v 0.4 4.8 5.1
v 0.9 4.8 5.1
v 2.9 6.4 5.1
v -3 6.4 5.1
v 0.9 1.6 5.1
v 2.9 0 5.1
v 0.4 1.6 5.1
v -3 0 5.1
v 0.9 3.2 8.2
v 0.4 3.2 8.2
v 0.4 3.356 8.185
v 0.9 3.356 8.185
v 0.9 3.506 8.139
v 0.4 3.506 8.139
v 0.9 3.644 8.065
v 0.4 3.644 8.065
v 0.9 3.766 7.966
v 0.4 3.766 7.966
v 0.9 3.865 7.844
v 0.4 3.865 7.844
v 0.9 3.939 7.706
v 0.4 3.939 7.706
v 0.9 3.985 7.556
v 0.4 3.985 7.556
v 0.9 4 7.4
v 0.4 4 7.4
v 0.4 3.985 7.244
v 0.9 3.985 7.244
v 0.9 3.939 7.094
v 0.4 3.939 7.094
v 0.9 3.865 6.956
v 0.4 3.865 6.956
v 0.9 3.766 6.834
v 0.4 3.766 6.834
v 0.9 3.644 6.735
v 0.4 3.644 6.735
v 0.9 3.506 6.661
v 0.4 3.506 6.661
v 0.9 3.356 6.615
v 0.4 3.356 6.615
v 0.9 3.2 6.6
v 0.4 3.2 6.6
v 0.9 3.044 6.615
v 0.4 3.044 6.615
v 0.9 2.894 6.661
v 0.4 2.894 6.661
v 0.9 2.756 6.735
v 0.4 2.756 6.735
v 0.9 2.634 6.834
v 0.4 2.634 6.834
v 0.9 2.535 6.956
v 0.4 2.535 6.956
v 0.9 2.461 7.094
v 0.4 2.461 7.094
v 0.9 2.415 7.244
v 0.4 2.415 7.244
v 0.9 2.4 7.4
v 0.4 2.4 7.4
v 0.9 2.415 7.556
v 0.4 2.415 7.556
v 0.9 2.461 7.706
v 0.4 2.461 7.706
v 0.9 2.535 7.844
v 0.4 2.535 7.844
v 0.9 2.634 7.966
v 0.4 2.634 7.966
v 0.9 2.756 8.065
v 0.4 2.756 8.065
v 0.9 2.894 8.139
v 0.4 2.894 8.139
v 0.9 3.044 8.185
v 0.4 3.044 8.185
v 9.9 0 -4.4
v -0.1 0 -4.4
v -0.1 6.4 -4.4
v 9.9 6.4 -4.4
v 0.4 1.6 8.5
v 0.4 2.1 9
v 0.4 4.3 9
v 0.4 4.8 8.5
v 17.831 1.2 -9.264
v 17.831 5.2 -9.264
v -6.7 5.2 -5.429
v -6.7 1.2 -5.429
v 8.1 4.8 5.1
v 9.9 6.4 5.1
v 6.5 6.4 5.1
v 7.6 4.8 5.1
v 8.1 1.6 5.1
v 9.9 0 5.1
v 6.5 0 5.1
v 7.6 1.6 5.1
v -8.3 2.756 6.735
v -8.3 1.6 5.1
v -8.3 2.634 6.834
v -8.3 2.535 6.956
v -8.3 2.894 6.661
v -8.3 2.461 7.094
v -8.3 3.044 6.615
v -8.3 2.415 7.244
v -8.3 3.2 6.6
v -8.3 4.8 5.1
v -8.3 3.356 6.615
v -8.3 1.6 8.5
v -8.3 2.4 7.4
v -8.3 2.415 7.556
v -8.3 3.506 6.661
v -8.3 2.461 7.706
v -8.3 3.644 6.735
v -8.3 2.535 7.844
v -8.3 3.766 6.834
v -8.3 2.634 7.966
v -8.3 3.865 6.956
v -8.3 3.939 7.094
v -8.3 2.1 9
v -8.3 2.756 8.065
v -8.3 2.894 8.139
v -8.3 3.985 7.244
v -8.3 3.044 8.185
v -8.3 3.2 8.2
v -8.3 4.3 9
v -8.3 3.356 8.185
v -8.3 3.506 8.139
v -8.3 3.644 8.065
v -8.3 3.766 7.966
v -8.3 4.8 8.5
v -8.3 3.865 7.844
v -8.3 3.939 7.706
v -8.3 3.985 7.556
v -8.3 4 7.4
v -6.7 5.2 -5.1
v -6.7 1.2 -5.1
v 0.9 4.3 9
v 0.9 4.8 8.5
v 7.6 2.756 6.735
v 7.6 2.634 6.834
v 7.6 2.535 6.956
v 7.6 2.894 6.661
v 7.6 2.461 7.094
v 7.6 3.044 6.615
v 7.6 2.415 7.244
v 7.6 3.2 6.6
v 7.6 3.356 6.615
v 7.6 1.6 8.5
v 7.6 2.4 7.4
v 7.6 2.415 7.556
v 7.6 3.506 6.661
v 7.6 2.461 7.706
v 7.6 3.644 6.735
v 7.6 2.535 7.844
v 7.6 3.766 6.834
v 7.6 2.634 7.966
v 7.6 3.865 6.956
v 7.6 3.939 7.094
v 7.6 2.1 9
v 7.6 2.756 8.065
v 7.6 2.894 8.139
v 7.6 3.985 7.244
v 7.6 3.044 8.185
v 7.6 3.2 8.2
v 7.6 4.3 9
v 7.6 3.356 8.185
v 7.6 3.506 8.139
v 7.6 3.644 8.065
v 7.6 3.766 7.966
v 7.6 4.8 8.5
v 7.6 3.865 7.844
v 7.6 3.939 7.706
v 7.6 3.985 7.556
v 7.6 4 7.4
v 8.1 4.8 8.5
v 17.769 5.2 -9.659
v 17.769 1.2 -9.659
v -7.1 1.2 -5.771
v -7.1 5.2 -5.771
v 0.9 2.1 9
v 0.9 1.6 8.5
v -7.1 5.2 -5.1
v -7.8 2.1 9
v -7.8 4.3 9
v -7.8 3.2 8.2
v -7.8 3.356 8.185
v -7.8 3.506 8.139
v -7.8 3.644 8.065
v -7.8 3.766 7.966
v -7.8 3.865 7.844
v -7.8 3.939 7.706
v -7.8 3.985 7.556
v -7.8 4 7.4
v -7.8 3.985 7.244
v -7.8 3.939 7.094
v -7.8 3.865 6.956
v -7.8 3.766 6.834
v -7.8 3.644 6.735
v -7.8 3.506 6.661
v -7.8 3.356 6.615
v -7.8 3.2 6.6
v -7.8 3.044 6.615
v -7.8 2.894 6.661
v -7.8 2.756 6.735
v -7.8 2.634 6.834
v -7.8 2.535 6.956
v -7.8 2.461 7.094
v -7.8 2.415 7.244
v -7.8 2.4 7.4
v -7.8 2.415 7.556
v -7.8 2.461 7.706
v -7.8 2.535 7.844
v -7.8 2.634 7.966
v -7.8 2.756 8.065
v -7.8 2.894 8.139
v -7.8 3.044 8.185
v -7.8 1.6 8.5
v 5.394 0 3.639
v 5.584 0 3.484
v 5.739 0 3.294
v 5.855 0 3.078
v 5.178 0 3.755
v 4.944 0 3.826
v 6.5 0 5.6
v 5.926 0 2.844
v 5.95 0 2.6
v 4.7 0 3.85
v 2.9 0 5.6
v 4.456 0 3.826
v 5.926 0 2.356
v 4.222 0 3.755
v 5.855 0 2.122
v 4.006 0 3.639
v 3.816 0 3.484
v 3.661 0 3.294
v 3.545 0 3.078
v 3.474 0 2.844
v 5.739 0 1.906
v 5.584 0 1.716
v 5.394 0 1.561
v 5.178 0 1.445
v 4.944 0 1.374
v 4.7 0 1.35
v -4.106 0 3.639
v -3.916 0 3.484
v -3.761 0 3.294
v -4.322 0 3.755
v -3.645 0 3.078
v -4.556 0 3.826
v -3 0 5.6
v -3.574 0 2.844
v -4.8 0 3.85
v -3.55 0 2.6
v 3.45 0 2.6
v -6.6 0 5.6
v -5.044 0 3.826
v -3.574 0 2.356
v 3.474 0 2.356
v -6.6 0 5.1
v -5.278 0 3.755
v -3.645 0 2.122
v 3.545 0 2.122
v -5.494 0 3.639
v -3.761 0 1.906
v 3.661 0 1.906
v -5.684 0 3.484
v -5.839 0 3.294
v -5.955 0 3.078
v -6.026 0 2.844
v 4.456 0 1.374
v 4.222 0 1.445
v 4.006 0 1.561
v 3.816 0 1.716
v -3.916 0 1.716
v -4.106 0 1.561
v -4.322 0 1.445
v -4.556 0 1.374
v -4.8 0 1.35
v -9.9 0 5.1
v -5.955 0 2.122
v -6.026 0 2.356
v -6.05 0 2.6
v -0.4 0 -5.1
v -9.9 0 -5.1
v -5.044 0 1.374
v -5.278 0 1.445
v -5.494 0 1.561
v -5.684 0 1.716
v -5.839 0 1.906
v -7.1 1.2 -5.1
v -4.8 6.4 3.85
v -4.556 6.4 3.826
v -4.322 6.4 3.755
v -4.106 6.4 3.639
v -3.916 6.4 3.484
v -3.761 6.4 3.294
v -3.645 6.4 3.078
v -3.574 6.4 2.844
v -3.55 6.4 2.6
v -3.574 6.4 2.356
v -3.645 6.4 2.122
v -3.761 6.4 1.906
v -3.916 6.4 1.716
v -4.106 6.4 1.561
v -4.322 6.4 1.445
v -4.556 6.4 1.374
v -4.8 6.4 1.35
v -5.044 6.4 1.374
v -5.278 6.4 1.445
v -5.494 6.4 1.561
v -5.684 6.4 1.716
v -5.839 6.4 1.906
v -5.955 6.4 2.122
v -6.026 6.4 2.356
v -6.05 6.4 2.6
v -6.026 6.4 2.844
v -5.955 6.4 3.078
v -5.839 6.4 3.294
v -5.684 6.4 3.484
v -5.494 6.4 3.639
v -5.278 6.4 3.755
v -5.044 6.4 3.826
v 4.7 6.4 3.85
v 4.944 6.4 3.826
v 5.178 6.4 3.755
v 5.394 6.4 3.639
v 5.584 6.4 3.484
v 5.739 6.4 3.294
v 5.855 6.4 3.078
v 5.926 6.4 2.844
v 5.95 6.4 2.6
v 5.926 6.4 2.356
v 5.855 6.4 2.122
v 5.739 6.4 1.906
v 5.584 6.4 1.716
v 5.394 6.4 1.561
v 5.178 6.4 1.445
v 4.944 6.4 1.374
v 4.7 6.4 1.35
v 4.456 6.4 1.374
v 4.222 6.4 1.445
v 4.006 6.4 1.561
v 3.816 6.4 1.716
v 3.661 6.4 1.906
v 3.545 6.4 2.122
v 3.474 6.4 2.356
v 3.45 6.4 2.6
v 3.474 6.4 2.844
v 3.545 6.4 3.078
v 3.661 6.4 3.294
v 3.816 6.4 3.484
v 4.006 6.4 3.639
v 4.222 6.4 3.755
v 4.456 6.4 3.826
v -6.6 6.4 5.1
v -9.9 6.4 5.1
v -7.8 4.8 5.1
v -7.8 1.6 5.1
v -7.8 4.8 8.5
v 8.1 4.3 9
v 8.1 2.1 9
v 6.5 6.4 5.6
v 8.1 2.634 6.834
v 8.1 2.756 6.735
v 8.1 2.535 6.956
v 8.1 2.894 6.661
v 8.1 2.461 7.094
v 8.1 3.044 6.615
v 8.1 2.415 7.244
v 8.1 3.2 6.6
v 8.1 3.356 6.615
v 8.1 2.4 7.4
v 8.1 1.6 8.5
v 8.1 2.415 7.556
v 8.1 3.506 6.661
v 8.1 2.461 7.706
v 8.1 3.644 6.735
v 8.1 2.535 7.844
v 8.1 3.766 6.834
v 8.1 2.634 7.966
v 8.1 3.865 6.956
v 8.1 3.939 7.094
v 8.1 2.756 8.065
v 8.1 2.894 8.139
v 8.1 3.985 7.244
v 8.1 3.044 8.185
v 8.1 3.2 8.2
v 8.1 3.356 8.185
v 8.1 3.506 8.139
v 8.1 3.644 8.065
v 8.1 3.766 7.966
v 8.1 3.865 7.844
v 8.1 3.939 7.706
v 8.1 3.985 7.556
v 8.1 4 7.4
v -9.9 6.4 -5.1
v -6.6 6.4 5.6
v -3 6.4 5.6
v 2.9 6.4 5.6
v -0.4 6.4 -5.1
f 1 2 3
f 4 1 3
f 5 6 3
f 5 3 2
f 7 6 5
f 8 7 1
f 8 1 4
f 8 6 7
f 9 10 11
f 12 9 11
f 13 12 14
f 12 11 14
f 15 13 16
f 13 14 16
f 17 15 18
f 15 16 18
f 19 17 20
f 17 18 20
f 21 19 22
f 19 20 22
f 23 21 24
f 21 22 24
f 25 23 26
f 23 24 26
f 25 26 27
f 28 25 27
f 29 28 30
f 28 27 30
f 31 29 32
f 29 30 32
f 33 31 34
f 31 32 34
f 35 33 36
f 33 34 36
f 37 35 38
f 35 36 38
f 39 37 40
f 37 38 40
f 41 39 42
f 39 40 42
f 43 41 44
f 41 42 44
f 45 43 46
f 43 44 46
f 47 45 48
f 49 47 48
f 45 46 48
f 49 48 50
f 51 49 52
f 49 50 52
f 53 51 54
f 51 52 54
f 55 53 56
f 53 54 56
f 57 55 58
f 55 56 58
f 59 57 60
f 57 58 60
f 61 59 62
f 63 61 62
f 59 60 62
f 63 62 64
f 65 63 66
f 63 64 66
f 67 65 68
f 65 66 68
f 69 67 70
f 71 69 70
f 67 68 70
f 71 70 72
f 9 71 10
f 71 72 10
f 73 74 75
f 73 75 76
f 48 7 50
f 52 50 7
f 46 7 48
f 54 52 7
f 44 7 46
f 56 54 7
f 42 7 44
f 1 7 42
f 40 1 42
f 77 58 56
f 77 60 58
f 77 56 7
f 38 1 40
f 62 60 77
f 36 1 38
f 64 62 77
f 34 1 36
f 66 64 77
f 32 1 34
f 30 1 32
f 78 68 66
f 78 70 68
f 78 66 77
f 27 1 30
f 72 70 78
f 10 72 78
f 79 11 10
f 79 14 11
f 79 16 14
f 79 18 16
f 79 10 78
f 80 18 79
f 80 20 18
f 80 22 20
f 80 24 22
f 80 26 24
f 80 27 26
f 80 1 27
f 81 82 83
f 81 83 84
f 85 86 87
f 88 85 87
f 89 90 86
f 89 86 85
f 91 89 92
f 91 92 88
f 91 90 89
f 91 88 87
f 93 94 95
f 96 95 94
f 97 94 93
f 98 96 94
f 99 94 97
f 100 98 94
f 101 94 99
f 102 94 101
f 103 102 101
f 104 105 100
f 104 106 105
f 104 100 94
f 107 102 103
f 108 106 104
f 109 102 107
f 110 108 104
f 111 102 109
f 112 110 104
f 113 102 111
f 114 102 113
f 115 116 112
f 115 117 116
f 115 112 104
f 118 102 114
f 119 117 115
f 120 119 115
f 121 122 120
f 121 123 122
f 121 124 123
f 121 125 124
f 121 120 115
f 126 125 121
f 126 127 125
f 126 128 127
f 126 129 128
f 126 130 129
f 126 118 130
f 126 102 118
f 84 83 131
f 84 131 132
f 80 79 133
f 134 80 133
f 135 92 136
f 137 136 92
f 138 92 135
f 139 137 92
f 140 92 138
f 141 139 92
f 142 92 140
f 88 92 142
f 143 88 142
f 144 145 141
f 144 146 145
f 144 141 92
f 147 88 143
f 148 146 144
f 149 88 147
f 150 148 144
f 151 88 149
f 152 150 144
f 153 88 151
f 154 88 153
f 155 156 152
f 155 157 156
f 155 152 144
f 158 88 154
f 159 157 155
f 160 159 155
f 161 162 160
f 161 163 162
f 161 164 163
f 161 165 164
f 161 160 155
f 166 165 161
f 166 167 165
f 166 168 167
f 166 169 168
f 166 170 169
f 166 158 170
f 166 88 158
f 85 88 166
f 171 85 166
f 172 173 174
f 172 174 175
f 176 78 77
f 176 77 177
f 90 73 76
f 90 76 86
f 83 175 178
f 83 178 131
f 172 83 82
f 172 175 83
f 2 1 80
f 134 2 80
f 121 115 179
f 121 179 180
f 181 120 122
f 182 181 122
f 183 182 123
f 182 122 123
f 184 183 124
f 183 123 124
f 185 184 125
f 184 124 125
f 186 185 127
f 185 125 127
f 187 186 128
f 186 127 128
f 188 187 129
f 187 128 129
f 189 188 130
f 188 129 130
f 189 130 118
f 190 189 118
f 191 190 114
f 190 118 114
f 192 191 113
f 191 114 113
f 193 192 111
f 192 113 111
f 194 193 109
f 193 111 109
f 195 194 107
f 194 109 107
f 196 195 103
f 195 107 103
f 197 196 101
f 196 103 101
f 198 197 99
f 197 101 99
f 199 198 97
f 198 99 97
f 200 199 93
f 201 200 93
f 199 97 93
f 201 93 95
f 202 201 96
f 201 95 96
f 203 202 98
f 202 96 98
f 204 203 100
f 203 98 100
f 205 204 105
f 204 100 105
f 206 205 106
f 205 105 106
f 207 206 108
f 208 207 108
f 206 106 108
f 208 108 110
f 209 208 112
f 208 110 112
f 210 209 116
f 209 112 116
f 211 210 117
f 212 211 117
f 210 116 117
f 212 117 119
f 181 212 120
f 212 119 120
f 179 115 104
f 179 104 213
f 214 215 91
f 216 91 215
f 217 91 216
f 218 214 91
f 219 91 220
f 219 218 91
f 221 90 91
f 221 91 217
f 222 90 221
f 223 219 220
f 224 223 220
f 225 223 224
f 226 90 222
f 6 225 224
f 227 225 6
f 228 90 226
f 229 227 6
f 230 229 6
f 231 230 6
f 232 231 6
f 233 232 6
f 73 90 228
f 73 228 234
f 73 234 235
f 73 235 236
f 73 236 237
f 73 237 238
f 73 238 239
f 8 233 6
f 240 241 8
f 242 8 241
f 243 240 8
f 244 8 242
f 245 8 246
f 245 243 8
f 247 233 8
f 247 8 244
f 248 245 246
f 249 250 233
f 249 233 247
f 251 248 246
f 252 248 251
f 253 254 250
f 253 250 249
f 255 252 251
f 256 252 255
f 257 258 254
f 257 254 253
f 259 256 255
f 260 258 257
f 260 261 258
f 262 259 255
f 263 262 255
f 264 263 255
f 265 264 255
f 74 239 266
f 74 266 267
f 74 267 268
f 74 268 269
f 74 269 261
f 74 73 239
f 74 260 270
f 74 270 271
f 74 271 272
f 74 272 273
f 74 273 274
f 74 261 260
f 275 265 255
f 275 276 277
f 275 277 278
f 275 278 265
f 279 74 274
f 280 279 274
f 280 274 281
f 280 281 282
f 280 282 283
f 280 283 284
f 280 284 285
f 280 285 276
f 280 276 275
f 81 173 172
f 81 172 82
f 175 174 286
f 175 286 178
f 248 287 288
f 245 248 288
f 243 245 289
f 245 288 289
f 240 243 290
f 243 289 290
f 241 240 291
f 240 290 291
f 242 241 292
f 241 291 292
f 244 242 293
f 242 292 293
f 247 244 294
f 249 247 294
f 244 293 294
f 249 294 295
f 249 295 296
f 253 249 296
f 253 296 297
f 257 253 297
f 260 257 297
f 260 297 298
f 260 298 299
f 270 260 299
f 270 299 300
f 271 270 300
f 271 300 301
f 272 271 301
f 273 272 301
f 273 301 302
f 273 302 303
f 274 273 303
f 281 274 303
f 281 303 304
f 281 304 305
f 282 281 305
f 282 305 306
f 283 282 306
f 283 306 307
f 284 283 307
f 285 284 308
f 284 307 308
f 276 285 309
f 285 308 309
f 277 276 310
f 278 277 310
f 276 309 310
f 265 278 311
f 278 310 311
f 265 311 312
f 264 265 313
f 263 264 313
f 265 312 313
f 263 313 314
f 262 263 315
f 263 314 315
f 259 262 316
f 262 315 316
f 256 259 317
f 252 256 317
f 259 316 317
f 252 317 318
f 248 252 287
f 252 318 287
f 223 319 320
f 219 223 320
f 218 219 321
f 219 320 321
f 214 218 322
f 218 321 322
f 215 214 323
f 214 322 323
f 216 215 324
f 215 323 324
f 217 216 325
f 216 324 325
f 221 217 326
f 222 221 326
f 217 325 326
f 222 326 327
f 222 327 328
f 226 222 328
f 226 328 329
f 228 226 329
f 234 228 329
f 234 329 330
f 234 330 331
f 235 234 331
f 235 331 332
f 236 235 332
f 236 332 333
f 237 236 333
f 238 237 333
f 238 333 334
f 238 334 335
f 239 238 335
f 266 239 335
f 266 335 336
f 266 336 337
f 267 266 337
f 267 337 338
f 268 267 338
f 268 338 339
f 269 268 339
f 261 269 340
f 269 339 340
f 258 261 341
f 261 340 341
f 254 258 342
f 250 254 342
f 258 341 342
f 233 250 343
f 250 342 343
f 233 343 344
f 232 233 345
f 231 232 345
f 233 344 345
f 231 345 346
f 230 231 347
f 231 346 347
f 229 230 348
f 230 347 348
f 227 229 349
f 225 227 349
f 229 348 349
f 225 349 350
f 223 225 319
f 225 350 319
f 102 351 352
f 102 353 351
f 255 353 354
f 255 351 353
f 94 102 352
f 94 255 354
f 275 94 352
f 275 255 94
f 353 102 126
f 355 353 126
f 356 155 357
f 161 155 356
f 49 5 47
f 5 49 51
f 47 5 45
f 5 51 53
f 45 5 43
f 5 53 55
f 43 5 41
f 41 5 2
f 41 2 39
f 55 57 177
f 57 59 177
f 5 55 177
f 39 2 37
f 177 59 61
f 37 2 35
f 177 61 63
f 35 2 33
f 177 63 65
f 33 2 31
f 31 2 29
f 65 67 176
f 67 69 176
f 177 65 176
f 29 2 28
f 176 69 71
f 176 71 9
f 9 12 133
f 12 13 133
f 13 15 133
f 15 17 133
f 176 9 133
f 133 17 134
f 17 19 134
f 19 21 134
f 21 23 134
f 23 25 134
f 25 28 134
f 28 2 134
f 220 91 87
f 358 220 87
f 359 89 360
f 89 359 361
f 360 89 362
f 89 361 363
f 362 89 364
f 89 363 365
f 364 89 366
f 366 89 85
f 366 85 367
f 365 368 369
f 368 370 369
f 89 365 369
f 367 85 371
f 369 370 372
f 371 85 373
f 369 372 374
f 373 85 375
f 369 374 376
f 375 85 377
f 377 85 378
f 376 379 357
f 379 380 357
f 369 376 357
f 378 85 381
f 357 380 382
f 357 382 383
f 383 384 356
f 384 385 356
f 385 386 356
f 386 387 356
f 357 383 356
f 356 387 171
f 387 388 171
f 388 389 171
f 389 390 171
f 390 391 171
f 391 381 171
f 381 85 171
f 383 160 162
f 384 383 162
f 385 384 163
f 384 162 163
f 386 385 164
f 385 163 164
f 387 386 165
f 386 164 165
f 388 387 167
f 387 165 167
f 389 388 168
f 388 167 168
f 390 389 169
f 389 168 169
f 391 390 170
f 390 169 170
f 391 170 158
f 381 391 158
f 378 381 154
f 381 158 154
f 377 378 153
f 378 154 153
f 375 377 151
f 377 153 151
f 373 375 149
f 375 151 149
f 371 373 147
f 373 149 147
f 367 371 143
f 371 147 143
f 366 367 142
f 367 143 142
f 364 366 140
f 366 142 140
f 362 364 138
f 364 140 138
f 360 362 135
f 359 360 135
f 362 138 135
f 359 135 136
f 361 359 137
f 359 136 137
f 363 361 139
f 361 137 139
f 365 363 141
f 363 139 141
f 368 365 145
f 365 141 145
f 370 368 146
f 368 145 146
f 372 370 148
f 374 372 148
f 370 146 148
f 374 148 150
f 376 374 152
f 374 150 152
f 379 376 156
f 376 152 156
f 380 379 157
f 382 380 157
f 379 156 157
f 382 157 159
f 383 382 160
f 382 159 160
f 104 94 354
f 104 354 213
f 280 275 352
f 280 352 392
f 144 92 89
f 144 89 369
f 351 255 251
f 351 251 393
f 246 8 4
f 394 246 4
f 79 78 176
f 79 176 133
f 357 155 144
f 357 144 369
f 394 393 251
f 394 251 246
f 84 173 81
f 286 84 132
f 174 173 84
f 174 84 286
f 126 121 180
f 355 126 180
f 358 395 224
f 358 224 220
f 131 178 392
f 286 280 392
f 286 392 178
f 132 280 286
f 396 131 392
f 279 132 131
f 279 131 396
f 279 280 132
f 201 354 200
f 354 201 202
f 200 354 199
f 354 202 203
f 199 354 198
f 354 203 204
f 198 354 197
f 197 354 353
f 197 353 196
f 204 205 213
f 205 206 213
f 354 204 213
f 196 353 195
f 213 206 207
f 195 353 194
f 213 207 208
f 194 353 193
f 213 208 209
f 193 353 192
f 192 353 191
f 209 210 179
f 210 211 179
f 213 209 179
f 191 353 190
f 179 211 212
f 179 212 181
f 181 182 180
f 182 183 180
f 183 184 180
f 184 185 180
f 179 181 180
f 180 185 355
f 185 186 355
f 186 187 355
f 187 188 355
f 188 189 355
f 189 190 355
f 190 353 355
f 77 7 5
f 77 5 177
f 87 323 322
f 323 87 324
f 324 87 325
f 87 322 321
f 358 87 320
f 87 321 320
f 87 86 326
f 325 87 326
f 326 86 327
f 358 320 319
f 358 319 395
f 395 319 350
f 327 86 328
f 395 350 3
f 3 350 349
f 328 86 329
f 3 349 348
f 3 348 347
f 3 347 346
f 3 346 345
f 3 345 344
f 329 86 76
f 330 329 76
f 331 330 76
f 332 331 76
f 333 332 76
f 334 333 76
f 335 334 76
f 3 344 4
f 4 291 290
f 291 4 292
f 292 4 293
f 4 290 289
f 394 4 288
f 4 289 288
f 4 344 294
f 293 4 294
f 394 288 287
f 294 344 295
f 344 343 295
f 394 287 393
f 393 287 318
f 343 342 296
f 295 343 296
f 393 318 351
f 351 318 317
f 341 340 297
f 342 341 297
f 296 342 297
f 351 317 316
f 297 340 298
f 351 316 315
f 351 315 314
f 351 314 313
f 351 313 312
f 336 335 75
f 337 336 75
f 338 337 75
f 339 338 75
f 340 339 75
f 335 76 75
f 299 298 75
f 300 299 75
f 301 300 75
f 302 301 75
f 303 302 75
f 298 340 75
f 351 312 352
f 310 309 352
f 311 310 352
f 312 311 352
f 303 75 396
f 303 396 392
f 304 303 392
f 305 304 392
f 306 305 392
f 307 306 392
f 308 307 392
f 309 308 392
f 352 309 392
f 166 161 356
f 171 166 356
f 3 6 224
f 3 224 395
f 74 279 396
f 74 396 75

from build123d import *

# Parameters (mm, degrees)
EXTRUDE_1_DEPTH                        = 6.4
SKETCH_3_R                             = 1.25
CUT_EXTRUDE_1_DEPTH                    = 13.844454056
EXTRUDE_START                          = -1.6
SKETCH_4_W                             = 3.9
SKETCH_4_H                             = 3.2
SKETCH_4_R                             = 0.8
EXTRUDE_2_DEPTH                        = 0.5
CHAMFER_1_SIZE                         = 0.5
PATTERN_LINEAR_1_COUNT                 = 2
PATTERN_LINEAR_1_PITCH                 = 8.7
CHAMFER_1_OF_PATTERN_LINEAR_1_SIZE     = 0.5
PATTERN_LINEAR_1_COL_COUNT             = 2
PATTERN_LINEAR_1_COL_PITCH             = 15.9
CHAMFER_1_OF_PATTERN_LINEAR_1_COL_SIZE = 0.5
SKETCH_6_W                             = 0.4
SKETCH_6_H                             = 4
SKETCH_7_W                             = 3.6
SKETCH_7_H                             = 6.4
EXTRUDE_4_DEPTH                        = 0.5


with BuildPart() as part:
    # 草圖1 → 填料-伸長1 (new body)
    with BuildSketch(Plane(origin=(0, 0, 0), x_dir=(1, 0, 0), z_dir=(0, 1, 0))):
        Polygon((-0.4, 5.1), (-0.1, 4.4), (9.9, 4.4), (9.9, -5.1), (-9.9, -5.1), (-9.9, 5.1), align=None)
    extrude(amount=EXTRUDE_1_DEPTH)

    # 草圖3 → 除料-伸長1 (cut, through all)
    with BuildSketch(Plane(origin=(0, 6.4, 0), x_dir=(1, 0, 0), z_dir=(0, 1, 0))):
        with Locations((-4.8, -2.6)):
            Circle(SKETCH_3_R)
        with Locations((4.7, -2.6)):
            Circle(SKETCH_3_R)
    extrude(amount=-CUT_EXTRUDE_1_DEPTH, mode=Mode.SUBTRACT)

    # 草圖4 → 填料-伸長2 (add)
    with BuildSketch(Plane.ZY.offset(9.9).offset(EXTRUDE_START)):
        with Locations((7.05, 3.2)):
            Rectangle(SKETCH_4_W, SKETCH_4_H)
        with Locations((7.4, 3.2)):
            Circle(SKETCH_4_R, mode=Mode.SUBTRACT)
    extrude_2 = extrude(amount=-EXTRUDE_2_DEPTH)

    # 導角1
    chamfer_1_edges = [part.edges().sort_by_distance(p)[0] for p in [
        (-8.05, 1.6, 9),
        (-8.05, 4.8, 9),
    ]]
    chamfer(chamfer_1_edges, length=CHAMFER_1_SIZE)

    # 直線複製排列1: 填料-伸長2 ×2
    with Locations(*[(i * PATTERN_LINEAR_1_PITCH, 0, 0) for i in range(1, PATTERN_LINEAR_1_COUNT)]):
        add(extrude_2)

    # 導角1 of 直線複製排列1
    chamfer_1_of_pattern_linear_1_edges = [part.edges().sort_by_distance(p)[0] for p in [
        (0.65, 1.6, 9),
        (0.65, 4.8, 9),
    ]]
    chamfer(chamfer_1_of_pattern_linear_1_edges, length=CHAMFER_1_OF_PATTERN_LINEAR_1_SIZE)

    # 直線複製排列1 col: 填料-伸長2 ×2
    with Locations(*[(i * PATTERN_LINEAR_1_COL_PITCH, 0, 0) for i in range(1, PATTERN_LINEAR_1_COL_COUNT)]):
        add(extrude_2)

    # 導角1 of 直線複製排列1 col
    chamfer_1_of_pattern_linear_1_col_edges = [part.edges().sort_by_distance(p)[0] for p in [
        (7.85, 1.6, 9),
        (7.85, 4.8, 9),
    ]]
    chamfer(chamfer_1_of_pattern_linear_1_col_edges, length=CHAMFER_1_OF_PATTERN_LINEAR_1_COL_SIZE)

    # 掃出1: sweep along a path in 草圖5
    with BuildLine(Plane(origin=(0, 3.2, 0), x_dir=(1, 0, 0), z_dir=(0, 1, 0))) as sweep_1_path:
        Line((-6.9, 5.1), (-6.9, 5.6))
        Line((-6.9, 5.6), (17.8, 9.461346915))
    # 草圖6 → 掃出1 (sweep)
    with BuildSketch(Plane(origin=(0, 0, -5.1), x_dir=(-1, 0, 0), z_dir=(0, 0, -1))):
        with Locations((6.9, 3.2)):
            Rectangle(SKETCH_6_W, SKETCH_6_H)
    sweep(path=sweep_1_path.line, transition=Transition.RIGHT)

    # 草圖7 → 填料-伸長4 (add)
    with BuildSketch(Plane.XY.offset(5.1)):
        with Locations((-4.8, 3.2)):
            Rectangle(SKETCH_7_W, SKETCH_7_H)
        with Locations((4.7, 3.2)):
            Rectangle(SKETCH_7_W, SKETCH_7_H)
    extrude(amount=EXTRUDE_4_DEPTH)


solid = part.part
